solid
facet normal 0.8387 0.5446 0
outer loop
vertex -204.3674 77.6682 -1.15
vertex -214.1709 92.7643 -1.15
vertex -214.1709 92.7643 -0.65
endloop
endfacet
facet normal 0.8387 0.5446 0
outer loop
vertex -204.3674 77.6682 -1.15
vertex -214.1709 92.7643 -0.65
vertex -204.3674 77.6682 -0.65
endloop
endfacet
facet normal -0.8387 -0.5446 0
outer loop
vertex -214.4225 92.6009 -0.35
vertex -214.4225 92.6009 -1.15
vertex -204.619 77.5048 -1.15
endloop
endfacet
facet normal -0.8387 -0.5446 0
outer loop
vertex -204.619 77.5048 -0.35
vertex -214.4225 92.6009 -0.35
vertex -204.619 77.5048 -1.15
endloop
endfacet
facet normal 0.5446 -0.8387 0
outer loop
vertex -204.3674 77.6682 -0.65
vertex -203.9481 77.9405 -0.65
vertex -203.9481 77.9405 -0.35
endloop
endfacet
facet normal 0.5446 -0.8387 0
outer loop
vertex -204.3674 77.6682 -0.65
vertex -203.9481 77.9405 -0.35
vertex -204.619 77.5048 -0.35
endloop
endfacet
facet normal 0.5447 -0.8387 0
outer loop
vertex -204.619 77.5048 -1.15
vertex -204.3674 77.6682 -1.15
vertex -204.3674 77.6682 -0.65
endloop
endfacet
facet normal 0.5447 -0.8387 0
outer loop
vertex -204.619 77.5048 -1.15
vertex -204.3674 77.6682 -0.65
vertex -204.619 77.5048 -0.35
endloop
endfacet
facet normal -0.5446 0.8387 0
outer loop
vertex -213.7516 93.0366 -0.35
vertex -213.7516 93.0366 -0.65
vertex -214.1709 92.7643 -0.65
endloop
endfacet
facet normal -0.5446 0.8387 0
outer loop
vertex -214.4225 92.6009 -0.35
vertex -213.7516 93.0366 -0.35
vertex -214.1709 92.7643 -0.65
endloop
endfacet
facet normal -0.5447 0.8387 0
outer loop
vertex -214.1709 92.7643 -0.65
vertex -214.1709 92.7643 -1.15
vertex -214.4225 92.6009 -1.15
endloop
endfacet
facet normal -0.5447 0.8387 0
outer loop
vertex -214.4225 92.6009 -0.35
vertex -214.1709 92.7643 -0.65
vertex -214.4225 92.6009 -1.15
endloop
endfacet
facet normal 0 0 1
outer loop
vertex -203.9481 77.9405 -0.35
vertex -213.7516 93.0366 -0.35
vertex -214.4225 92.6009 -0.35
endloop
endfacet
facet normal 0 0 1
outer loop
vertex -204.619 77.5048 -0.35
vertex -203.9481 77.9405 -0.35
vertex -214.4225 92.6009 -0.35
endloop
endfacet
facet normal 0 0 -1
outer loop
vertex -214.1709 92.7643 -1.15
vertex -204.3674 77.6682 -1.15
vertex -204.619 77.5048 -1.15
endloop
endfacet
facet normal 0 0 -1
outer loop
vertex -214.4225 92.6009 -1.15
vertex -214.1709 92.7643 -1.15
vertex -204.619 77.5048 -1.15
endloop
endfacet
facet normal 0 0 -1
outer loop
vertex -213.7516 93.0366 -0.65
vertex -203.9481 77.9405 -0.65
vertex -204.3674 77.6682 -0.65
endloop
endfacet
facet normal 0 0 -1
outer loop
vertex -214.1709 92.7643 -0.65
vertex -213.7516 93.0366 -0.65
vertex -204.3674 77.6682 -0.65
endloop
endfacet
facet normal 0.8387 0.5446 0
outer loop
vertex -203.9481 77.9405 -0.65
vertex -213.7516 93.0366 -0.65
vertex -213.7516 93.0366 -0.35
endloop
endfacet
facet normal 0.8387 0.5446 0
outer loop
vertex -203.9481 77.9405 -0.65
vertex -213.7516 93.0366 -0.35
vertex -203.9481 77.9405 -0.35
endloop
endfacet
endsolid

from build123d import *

# Parameters (mm, degrees)
BOX161_W               = 0.8
BOX161_H               = 18
BOX161_DEPTH           = 0.8
BOX162_W               = 0.8
BOX162_H               = 18
BOX162_DEPTH           = 0.8
CUT084_PLACEMENT_ANGLE = 213


with BuildPart() as cubo161:
    # Box161 → Box161 (new body)
    with BuildSketch(Plane.XY):
        with Locations((0.4, 9)):
            Rectangle(BOX161_W, BOX161_H)
    extrude(amount=BOX161_DEPTH)


with BuildPart() as perfil_l_2da_cara026:
    # Box162 → Box162 (new body)
    with BuildSketch(Plane(origin=(0.3, 0, 0.3), x_dir=(1, 0, 0), z_dir=(0, 0, 1))):
        with Locations((0.4, 9)):
            Rectangle(BOX162_W, BOX162_H)
    extrude(amount=BOX162_DEPTH)

    # Cut084: cut Cubo161
    add(cubo161.part, mode=Mode.SUBTRACT)


with BuildPart() as perfil_l_2da_cara026_1:
    # Cut084 placement: moved
    add(perfil_l_2da_cara026.part.moved(Location((-213.5, 93.2, -1.45))).rotate(Axis((-213.5, 93.2, -1.45), (0, 0, 1)), CUT084_PLACEMENT_ANGLE))


solid = perfil_l_2da_cara026_1.part
